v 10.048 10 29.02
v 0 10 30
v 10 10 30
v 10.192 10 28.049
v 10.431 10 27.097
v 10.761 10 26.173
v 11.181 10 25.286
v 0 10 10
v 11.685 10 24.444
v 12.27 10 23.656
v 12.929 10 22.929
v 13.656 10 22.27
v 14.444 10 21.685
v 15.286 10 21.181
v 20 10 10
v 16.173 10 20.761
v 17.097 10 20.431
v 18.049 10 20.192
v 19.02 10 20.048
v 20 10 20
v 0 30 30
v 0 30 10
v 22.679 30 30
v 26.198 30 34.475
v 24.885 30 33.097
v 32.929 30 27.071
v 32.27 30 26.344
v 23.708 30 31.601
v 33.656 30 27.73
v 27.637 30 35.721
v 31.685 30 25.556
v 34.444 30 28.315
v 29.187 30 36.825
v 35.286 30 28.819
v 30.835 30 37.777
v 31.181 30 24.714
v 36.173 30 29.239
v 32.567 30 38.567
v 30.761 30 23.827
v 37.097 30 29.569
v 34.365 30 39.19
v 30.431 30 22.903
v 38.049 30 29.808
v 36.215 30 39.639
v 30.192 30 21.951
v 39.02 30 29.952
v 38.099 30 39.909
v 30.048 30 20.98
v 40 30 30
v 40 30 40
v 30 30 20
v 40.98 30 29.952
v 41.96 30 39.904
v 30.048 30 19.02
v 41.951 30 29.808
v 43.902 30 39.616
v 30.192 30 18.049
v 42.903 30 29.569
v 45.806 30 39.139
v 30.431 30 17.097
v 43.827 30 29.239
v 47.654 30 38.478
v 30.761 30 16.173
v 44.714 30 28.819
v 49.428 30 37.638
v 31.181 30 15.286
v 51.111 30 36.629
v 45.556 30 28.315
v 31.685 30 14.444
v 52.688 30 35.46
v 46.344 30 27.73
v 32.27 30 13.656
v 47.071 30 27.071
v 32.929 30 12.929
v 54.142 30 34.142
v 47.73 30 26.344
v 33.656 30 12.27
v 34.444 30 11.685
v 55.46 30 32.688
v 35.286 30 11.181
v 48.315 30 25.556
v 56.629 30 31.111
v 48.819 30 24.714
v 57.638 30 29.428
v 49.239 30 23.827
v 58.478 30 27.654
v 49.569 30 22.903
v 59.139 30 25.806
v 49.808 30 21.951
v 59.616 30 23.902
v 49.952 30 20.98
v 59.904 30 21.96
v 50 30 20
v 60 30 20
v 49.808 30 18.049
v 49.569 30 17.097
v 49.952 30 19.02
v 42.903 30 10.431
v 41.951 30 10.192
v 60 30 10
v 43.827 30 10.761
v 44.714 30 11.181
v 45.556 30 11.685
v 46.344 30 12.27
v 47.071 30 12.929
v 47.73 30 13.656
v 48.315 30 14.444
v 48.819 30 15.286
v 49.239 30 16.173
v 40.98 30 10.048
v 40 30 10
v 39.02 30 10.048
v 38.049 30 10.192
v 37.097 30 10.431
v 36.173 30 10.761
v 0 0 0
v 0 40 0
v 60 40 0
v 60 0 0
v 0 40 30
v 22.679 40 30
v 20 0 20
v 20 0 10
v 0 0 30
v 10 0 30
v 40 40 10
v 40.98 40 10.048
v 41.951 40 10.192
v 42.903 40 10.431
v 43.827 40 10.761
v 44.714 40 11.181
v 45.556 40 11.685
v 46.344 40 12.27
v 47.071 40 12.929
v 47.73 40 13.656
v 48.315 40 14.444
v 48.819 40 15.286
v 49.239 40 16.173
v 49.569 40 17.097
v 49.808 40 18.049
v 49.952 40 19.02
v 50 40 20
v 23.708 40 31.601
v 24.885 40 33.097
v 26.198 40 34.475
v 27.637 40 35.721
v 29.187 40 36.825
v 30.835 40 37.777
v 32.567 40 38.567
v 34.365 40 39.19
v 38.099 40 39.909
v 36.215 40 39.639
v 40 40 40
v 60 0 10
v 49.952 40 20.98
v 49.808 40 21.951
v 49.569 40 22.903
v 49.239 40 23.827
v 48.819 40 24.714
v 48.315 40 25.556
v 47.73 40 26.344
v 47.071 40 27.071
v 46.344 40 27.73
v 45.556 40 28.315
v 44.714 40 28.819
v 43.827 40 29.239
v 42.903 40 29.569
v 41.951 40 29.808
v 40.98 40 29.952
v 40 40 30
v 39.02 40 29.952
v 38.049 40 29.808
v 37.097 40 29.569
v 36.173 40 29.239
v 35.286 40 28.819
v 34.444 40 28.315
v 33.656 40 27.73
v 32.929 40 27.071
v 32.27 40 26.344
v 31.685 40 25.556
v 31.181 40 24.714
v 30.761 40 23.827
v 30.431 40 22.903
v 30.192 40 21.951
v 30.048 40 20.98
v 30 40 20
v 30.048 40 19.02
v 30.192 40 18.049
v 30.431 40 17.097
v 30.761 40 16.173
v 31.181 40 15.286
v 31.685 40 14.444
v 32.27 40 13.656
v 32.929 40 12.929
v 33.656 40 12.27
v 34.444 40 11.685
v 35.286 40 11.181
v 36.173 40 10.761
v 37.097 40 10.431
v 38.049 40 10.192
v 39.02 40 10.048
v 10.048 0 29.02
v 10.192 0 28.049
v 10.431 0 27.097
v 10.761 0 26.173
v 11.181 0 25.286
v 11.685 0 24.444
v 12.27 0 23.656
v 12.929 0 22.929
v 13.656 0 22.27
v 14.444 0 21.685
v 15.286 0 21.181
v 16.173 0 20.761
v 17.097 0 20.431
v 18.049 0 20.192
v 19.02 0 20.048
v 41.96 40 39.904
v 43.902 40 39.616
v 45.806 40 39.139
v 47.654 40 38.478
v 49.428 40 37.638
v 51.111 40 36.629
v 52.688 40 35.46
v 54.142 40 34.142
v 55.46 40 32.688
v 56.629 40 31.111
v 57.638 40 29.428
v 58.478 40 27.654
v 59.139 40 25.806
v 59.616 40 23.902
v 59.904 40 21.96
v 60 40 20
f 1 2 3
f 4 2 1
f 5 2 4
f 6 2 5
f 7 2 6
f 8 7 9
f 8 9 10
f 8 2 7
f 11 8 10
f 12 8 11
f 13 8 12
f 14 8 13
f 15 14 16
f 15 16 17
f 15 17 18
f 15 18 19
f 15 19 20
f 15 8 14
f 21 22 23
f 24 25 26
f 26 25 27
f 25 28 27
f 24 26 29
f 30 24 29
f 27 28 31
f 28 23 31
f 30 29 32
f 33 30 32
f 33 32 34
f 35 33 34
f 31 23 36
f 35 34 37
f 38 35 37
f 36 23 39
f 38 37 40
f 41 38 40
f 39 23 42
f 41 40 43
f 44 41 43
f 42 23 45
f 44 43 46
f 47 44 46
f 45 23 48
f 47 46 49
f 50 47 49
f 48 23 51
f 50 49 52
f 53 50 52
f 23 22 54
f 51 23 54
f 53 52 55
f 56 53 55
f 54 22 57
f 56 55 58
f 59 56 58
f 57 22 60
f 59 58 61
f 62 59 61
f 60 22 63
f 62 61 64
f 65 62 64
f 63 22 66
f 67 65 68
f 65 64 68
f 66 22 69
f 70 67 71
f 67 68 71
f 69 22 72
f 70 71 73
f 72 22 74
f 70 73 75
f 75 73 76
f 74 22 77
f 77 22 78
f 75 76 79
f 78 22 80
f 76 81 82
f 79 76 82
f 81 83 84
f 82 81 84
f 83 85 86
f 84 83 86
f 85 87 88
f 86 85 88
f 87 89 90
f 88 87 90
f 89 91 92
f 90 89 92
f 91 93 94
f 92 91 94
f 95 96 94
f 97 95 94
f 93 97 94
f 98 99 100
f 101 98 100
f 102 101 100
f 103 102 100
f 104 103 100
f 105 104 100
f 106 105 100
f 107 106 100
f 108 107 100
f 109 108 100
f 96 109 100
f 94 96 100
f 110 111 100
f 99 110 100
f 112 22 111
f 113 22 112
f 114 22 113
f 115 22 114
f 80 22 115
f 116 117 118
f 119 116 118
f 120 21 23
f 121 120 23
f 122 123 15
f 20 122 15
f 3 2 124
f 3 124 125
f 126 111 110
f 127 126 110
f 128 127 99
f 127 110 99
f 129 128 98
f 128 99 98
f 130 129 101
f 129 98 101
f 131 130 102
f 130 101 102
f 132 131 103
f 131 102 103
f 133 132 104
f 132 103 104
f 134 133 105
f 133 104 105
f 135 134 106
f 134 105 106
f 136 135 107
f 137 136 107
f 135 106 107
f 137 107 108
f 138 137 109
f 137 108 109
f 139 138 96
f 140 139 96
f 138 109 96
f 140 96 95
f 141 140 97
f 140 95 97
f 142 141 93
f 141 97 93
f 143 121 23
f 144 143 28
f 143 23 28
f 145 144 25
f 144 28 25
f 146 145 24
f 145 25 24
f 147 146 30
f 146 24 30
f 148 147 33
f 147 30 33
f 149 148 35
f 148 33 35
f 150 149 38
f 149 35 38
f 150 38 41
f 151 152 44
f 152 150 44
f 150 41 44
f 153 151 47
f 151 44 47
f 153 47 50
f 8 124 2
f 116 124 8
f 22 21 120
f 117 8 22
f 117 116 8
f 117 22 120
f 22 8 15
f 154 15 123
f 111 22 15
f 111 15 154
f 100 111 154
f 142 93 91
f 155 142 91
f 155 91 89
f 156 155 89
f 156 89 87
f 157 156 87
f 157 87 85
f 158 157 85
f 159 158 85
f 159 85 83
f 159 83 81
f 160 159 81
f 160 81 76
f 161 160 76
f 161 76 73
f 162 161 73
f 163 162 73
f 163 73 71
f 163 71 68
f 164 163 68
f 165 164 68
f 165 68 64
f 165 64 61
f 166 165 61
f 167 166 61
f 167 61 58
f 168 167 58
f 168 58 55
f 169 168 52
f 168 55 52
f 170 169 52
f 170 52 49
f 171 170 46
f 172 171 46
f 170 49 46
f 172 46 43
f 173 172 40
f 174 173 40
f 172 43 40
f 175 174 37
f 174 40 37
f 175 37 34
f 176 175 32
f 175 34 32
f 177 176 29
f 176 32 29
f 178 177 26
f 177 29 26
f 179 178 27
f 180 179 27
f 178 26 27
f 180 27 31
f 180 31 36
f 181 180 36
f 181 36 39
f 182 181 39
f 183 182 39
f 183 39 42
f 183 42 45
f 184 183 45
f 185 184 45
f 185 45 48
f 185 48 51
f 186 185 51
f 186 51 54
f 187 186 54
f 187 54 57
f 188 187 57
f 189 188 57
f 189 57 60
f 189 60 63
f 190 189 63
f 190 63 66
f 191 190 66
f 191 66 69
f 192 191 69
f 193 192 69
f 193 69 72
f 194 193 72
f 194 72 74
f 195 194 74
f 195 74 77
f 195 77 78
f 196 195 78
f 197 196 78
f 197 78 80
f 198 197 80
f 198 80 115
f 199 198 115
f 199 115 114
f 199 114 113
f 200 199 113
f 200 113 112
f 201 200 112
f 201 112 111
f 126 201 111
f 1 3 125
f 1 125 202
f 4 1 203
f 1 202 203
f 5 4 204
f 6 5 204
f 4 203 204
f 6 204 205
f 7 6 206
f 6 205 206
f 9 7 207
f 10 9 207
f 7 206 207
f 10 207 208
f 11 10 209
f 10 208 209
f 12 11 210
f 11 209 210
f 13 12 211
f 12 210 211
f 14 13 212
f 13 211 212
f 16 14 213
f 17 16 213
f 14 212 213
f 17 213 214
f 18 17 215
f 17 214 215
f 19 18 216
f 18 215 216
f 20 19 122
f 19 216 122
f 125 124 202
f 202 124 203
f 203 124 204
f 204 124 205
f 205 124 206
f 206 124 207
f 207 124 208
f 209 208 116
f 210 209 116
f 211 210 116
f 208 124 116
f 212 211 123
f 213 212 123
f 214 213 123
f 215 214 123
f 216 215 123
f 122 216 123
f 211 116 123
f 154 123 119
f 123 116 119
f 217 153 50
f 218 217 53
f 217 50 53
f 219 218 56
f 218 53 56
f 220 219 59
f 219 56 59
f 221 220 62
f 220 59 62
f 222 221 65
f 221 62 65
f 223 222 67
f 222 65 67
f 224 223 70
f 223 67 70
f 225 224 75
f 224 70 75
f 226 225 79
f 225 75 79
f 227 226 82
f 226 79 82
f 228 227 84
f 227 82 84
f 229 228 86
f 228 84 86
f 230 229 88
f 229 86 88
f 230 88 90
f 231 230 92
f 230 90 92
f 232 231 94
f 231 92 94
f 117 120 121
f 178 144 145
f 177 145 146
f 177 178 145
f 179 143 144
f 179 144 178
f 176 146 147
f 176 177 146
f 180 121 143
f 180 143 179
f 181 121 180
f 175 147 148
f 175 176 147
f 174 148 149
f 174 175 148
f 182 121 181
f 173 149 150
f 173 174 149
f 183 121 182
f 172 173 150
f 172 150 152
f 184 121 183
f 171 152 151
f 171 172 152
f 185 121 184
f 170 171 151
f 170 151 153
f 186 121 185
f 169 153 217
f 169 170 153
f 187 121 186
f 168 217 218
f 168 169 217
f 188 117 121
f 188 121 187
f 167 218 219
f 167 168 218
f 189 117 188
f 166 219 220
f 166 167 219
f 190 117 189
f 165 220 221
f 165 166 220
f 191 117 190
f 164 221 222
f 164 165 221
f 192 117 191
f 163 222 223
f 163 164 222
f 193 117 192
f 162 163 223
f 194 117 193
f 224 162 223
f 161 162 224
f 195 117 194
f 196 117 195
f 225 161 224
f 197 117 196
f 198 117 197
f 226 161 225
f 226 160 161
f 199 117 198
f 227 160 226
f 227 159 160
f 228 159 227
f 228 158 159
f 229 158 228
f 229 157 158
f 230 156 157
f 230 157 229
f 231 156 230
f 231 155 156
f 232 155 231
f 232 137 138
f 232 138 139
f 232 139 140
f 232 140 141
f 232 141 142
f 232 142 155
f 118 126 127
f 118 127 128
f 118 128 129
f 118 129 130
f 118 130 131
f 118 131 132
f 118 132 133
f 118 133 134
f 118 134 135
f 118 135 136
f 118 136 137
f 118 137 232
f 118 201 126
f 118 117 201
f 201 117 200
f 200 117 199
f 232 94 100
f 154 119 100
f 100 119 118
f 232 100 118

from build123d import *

# Parameters (mm, degrees)
F1_DEPTH = 10
F0_W     = 20
F0_H     = 10
F2_DEPTH = 30
F0_W_2   = 60
F3_DEPTH = 40
F5_DEPTH = 10
F7_DEPTH = 10.001
F8_DEPTH = 10.001


with BuildPart() as f1:
    # F0 (on Top) → F1 (new body)
    with BuildSketch(Plane.XY):
        Polygon((20, 10), (20, 0), (60, 0), (60, 30), (0, 30), (0, 10), align=None)
    extrude(amount=F1_DEPTH)

    # F0 (on Top) → F2 (join)
    with BuildSketch(Plane.XY):
        with Locations((10, 5)):
            Rectangle(F0_W, F0_H)
    extrude(amount=F2_DEPTH)

    # F0 (on Top) → F3 (join)
    with BuildSketch(Plane.XY):
        with Locations((30, 35)):
            Rectangle(F0_W_2, F0_H)
    extrude(amount=F3_DEPTH)

    # F4 (on face) → F5 (cut, through all)
    with BuildSketch(Plane.XZ):
        with BuildLine():
            Line((20, 30), (10, 30))
            ThreePointArc((10, 30), (12.928932, 22.928932), (20, 20))
            Line((20, 20), (20, 30))
        make_face()
    extrude(amount=-F5_DEPTH, mode=Mode.SUBTRACT)

    # F6 (on face) → F7 (cut, through all)
    with BuildSketch(Plane.XZ.offset(-30)):
        with BuildLine():
            ThreePointArc((22.679492, 30), (30, 37.320508), (40, 40))
            Line((40, 40), (0, 40))
            Line((0, 40), (0, 30))
            Line((0, 30), (22.679492, 30))
        make_face()
        with BuildLine():
            ThreePointArc((40, 40), (54.142136, 34.142136), (60, 20))
            Line((60, 20), (60, 40))
            Line((60, 40), (40, 40))
        make_face()
    extrude(amount=-F7_DEPTH, mode=Mode.SUBTRACT)

    # F6 (on face) → F8 (cut, through all)
    with BuildSketch(Plane.XZ.offset(-30)):
        with BuildLine():
            ThreePointArc((50, 20), (32.928932, 27.071068), (40, 10))
            ThreePointArc((40, 10), (47.071068, 12.928932), (50, 20))
        make_face()
    extrude(amount=-F8_DEPTH, mode=Mode.SUBTRACT)


solid = f1.part
